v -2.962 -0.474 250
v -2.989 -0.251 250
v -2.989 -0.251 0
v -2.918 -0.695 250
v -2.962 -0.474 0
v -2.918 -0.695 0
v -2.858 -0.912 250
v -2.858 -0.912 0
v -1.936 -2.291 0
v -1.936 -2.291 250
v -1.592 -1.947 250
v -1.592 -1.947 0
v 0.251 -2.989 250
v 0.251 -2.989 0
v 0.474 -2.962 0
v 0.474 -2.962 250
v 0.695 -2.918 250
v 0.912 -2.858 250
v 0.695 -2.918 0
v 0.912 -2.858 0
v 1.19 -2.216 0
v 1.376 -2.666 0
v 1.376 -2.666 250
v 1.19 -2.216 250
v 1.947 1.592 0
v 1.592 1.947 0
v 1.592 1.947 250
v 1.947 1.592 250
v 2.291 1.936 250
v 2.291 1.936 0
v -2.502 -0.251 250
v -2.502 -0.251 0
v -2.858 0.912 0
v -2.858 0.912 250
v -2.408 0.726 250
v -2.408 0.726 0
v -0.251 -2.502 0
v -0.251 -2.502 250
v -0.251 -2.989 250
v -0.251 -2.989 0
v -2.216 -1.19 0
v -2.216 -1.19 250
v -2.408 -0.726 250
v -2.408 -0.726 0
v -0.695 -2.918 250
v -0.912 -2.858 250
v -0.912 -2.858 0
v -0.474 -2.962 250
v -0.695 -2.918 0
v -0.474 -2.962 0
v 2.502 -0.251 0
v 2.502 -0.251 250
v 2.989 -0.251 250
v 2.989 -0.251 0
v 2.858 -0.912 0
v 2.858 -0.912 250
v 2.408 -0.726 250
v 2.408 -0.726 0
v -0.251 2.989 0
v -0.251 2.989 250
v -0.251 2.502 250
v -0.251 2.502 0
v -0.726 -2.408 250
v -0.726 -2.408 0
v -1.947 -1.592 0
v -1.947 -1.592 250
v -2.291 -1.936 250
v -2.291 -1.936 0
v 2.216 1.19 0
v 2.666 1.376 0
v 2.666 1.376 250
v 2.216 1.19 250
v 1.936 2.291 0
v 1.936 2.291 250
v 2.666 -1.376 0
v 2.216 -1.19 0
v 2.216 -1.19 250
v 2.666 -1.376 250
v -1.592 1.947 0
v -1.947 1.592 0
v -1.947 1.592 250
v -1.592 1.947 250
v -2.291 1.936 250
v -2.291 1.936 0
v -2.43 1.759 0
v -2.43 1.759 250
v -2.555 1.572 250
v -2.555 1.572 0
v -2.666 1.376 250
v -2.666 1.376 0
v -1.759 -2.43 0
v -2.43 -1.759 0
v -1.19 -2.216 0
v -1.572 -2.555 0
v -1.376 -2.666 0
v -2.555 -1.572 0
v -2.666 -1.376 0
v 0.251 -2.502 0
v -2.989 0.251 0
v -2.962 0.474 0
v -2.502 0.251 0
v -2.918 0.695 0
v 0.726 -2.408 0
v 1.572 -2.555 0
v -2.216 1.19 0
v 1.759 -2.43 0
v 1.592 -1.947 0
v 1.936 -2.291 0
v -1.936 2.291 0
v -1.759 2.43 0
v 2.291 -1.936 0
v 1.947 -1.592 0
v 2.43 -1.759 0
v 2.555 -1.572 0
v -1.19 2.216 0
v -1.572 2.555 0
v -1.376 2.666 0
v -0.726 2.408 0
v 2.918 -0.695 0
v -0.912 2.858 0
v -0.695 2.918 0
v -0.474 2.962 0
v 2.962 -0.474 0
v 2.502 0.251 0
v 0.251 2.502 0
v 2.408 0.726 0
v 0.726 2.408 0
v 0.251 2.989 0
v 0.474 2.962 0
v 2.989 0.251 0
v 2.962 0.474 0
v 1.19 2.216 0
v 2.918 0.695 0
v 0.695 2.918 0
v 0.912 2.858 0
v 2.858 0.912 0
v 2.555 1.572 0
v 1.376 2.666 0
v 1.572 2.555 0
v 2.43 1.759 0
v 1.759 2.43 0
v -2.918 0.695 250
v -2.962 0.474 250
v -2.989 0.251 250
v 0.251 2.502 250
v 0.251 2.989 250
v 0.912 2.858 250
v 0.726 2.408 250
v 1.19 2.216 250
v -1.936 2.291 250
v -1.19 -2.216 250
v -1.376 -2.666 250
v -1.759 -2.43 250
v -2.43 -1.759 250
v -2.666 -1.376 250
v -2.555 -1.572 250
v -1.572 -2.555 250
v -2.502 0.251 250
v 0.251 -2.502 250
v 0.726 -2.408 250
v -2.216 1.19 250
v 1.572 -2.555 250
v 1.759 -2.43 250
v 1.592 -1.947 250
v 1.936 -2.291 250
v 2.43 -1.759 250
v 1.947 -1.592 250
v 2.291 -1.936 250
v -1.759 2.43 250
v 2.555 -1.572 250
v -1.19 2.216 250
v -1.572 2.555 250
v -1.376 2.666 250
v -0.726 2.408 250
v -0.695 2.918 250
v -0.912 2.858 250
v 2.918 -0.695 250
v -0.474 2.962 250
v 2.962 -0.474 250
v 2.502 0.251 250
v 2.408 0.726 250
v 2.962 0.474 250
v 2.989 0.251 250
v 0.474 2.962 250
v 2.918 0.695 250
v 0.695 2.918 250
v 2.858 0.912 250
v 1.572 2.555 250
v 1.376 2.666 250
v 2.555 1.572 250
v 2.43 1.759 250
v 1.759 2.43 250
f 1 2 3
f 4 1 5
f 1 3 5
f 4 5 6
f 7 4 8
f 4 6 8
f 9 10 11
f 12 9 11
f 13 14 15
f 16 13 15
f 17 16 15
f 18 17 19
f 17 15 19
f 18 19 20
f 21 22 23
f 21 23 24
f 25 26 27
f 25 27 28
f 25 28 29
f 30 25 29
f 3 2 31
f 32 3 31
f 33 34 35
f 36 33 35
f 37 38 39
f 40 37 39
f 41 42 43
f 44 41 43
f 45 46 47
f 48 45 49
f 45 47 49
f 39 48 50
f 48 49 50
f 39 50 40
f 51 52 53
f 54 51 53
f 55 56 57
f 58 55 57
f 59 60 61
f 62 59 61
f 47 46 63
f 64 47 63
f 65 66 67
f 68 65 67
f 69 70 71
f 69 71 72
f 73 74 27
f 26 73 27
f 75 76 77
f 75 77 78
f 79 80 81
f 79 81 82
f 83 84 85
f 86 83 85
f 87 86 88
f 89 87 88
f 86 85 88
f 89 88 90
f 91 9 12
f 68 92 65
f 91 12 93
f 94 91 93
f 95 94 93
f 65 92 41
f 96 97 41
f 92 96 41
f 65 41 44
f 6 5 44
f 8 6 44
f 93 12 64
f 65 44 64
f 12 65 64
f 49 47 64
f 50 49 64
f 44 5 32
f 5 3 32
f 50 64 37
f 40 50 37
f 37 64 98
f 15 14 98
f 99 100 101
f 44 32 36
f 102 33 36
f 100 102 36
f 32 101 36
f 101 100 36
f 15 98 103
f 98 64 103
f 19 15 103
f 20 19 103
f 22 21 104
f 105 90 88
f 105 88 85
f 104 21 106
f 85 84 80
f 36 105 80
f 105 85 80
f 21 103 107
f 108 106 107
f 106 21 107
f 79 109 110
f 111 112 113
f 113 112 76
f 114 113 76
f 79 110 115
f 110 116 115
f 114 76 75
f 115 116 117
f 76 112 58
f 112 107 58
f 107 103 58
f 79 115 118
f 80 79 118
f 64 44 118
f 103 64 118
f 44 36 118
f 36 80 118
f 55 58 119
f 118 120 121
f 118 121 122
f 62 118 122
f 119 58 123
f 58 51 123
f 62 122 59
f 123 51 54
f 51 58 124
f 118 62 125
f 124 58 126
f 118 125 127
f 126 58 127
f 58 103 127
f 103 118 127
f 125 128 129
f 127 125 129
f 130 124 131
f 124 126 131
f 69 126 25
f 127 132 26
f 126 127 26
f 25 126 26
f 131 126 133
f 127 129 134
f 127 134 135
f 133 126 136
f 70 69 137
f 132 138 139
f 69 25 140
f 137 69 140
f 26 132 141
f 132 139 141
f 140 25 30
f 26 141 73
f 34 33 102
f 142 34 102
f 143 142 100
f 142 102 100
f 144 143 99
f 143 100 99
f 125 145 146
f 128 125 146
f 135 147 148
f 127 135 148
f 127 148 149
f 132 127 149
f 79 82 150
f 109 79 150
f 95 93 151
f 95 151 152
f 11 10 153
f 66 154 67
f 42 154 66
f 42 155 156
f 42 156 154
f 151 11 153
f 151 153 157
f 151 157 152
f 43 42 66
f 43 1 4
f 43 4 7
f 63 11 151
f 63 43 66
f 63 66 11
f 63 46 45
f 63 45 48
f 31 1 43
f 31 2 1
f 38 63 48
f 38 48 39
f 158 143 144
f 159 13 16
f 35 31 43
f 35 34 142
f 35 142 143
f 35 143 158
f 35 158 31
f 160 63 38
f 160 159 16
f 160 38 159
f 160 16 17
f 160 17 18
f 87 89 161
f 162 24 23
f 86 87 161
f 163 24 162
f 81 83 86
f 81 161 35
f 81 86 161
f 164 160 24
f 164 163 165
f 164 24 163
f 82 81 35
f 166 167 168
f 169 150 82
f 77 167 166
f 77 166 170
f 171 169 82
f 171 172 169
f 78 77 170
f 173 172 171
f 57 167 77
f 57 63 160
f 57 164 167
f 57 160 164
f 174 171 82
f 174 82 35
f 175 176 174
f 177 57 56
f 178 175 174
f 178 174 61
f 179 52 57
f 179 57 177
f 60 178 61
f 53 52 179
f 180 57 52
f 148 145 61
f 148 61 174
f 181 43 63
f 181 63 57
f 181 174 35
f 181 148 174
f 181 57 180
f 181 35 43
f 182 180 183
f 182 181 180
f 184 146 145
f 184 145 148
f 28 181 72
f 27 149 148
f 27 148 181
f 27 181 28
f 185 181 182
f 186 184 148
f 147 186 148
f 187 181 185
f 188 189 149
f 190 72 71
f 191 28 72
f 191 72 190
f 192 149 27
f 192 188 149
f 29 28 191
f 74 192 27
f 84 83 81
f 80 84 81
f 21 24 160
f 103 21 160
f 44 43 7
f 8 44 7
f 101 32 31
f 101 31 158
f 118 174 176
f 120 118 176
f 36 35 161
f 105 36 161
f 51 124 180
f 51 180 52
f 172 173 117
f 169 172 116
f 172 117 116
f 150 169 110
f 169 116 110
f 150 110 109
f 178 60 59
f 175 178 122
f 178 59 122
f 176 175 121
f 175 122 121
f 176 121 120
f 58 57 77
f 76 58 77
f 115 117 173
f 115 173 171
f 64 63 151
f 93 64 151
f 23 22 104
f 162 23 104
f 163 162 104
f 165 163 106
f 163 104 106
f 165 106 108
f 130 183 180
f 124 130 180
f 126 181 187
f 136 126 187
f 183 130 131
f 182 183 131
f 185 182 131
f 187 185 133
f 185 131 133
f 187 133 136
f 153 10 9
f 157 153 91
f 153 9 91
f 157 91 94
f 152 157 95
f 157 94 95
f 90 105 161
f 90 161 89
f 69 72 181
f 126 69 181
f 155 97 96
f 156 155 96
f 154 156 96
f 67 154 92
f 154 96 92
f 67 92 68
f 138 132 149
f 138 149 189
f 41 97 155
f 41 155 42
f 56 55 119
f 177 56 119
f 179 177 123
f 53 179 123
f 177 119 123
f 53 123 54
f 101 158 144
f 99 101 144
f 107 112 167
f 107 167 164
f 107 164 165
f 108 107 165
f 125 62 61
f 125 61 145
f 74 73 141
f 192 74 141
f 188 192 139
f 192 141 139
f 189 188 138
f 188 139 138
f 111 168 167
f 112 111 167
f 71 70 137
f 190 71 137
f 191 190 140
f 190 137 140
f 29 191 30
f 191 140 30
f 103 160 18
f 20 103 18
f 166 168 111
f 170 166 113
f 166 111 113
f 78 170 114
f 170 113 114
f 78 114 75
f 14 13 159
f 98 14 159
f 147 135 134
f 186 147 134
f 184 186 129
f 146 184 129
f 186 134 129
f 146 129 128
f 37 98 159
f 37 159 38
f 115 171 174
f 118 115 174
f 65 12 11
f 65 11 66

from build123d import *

# Parameters (mm, degrees)
SKETCH1_R           = 3
BOSS_EXTRUDE1_DEPTH = 250
CUT_EXTRUDE2_DEPTH  = 251.035997408


with BuildPart() as part:
    # Sketch1 → Boss-Extrude1 (new body)
    with BuildSketch(Plane.XY):
        Circle(SKETCH1_R)
    extrude(amount=BOSS_EXTRUDE1_DEPTH)

    # Sketch2 → Cut-Extrude2 (cut, through all)
    with BuildSketch(Plane.XY.offset(250)):
        with BuildLine():
            ThreePointArc((2.857977755, 0.912120142), (2.771638598, 1.148050297), (2.665861788, 1.375929113))
            Line((2.665861788, 1.375929113), (2.21589064, 1.189544961))
            Line((2.21589064, 1.189544961), (2.408006606, 0.725735989))
            Line((2.408006606, 0.725735989), (2.857977755, 0.912120142))
        make_face()
        with BuildLine():
            ThreePointArc((2.291373885, 1.936389867), (2.121320344, 2.121320344), (1.936389867, 2.291373885))
            Line((1.936389867, 2.291373885), (1.59199686, 1.946980878))
            Line((1.59199686, 1.946980878), (1.946980878, 1.59199686))
            Line((1.946980878, 1.59199686), (2.291373885, 1.936389867))
        make_face()
        with BuildLine():
            ThreePointArc((0.251011607, 2.989480419), (0.125615971, 2.997368951), (0, 3))
            Line((0, 3), (0, 2.502435157))
            Line((0, 2.502435157), (0.251011607, 2.502435157))
            Line((0.251011607, 2.502435157), (0.251011607, 2.989480419))
        make_face()
        with BuildLine():
            Line((0, 2.502435157), (0, 3))
            ThreePointArc((0, 3), (-0.125615971, 2.997368951), (-0.251011607, 2.989480419))
            Line((-0.251011607, 2.989480419), (-0.251011607, 2.502435157))
            Line((-0.251011607, 2.502435157), (0, 2.502435157))
        make_face()
        with BuildLine():
            Line((-0.725735989, 2.408006606), (-0.912120142, 2.857977755))
            ThreePointArc((-0.912120142, 2.857977755), (-1.148050297, 2.771638598), (-1.375929113, 2.665861788))
            Line((-1.375929113, 2.665861788), (-1.189544961, 2.21589064))
            Line((-1.189544961, 2.21589064), (-0.725735989, 2.408006606))
        make_face()
        with BuildLine():
            Line((-1.59199686, 1.946980878), (-1.936389867, 2.291373885))
            ThreePointArc((-1.936389867, 2.291373885), (-2.121320344, 2.121320344), (-2.291373885, 1.936389867))
            Line((-2.291373885, 1.936389867), (-1.946980878, 1.59199686))
            Line((-1.946980878, 1.59199686), (-1.59199686, 1.946980878))
        make_face()
        with BuildLine():
            Line((-2.21589064, 1.189544961), (-2.665861788, 1.375929113))
            ThreePointArc((-2.665861788, 1.375929113), (-2.771638598, 1.148050297), (-2.857977755, 0.912120142))
            Line((-2.857977755, 0.912120142), (-2.408006606, 0.725735989))
            Line((-2.408006606, 0.725735989), (-2.21589064, 1.189544961))
        make_face()
        with BuildLine():
            Line((-2.502435157, 0.251011607), (-2.989480419, 0.251011607))
            ThreePointArc((-2.989480419, 0.251011607), (-3, 0), (-2.989480419, -0.251011607))
            Line((-2.989480419, -0.251011607), (-2.502435157, -0.251011607))
            Line((-2.502435157, -0.251011607), (-2.502435157, 0.251011607))
        make_face()
        with BuildLine():
            Line((-2.408006606, -0.725735989), (-2.857977755, -0.912120142))
            ThreePointArc((-2.857977755, -0.912120142), (-2.771638598, -1.148050297), (-2.665861788, -1.375929113))
            Line((-2.665861788, -1.375929113), (-2.21589064, -1.189544961))
            Line((-2.21589064, -1.189544961), (-2.408006606, -0.725735989))
        make_face()
        with BuildLine():
            Line((-1.946980878, -1.59199686), (-2.291373885, -1.936389867))
            ThreePointArc((-2.291373885, -1.936389867), (-2.121320344, -2.121320344), (-1.936389867, -2.291373885))
            Line((-1.936389867, -2.291373885), (-1.59199686, -1.946980878))
            Line((-1.59199686, -1.946980878), (-1.946980878, -1.59199686))
        make_face()
        with BuildLine():
            Line((-1.189544961, -2.21589064), (-1.375929113, -2.665861788))
            ThreePointArc((-1.375929113, -2.665861788), (-1.148050297, -2.771638598), (-0.912120142, -2.857977755))
            Line((-0.912120142, -2.857977755), (-0.725735989, -2.408006606))
            Line((-0.725735989, -2.408006606), (-1.189544961, -2.21589064))
        make_face()
        with BuildLine():
            Line((-0.251011607, -2.502435157), (-0.251011607, -2.989480419))
            ThreePointArc((-0.251011607, -2.989480419), (0, -3), (0.251011607, -2.989480419))
            Line((0.251011607, -2.989480419), (0.251011607, -2.502435157))
            Line((0.251011607, -2.502435157), (-0.251011607, -2.502435157))
        make_face()
        with BuildLine():
            ThreePointArc((0.912120142, -2.857977755), (1.148050297, -2.771638598), (1.375929113, -2.665861788))
            Line((1.375929113, -2.665861788), (1.189544961, -2.21589064))
            Line((1.189544961, -2.21589064), (0.725735989, -2.408006606))
            Line((0.725735989, -2.408006606), (0.912120142, -2.857977755))
        make_face()
        with BuildLine():
            ThreePointArc((1.936389867, -2.291373885), (2.121320344, -2.121320344), (2.291373885, -1.936389867))
            Line((2.291373885, -1.936389867), (1.946980878, -1.59199686))
            Line((1.946980878, -1.59199686), (1.59199686, -1.946980878))
            Line((1.59199686, -1.946980878), (1.936389867, -2.291373885))
        make_face()
        with BuildLine():
            ThreePointArc((2.665861788, -1.375929113), (2.771638598, -1.148050297), (2.857977755, -0.912120142))
            Line((2.857977755, -0.912120142), (2.408006606, -0.725735989))
            Line((2.408006606, -0.725735989), (2.21589064, -1.189544961))
            Line((2.21589064, -1.189544961), (2.665861788, -1.375929113))
        make_face()
        with BuildLine():
            ThreePointArc((3, 0), (2.997368951, 0.125615971), (2.989480419, 0.251011607))
            Line((2.989480419, 0.251011607), (2.502435157, 0.251011607))
            Line((2.502435157, 0.251011607), (2.502435157, -0.251011607))
            Line((2.502435157, -0.251011607), (2.989480419, -0.251011607))
            ThreePointArc((2.989480419, -0.251011607), (2.997368951, -0.125615971), (3, 0))
        make_face()
        with BuildLine():
            ThreePointArc((1.375929113, 2.665861788), (1.148050297, 2.771638598), (0.912120142, 2.857977755))
            Line((0.912120142, 2.857977755), (0.725735989, 2.408006606))
            Line((0.725735989, 2.408006606), (1.189544961, 2.21589064))
            Line((1.189544961, 2.21589064), (1.375929113, 2.665861788))
        make_face()
    extrude(amount=-CUT_EXTRUDE2_DEPTH, mode=Mode.SUBTRACT)


solid = part.part
